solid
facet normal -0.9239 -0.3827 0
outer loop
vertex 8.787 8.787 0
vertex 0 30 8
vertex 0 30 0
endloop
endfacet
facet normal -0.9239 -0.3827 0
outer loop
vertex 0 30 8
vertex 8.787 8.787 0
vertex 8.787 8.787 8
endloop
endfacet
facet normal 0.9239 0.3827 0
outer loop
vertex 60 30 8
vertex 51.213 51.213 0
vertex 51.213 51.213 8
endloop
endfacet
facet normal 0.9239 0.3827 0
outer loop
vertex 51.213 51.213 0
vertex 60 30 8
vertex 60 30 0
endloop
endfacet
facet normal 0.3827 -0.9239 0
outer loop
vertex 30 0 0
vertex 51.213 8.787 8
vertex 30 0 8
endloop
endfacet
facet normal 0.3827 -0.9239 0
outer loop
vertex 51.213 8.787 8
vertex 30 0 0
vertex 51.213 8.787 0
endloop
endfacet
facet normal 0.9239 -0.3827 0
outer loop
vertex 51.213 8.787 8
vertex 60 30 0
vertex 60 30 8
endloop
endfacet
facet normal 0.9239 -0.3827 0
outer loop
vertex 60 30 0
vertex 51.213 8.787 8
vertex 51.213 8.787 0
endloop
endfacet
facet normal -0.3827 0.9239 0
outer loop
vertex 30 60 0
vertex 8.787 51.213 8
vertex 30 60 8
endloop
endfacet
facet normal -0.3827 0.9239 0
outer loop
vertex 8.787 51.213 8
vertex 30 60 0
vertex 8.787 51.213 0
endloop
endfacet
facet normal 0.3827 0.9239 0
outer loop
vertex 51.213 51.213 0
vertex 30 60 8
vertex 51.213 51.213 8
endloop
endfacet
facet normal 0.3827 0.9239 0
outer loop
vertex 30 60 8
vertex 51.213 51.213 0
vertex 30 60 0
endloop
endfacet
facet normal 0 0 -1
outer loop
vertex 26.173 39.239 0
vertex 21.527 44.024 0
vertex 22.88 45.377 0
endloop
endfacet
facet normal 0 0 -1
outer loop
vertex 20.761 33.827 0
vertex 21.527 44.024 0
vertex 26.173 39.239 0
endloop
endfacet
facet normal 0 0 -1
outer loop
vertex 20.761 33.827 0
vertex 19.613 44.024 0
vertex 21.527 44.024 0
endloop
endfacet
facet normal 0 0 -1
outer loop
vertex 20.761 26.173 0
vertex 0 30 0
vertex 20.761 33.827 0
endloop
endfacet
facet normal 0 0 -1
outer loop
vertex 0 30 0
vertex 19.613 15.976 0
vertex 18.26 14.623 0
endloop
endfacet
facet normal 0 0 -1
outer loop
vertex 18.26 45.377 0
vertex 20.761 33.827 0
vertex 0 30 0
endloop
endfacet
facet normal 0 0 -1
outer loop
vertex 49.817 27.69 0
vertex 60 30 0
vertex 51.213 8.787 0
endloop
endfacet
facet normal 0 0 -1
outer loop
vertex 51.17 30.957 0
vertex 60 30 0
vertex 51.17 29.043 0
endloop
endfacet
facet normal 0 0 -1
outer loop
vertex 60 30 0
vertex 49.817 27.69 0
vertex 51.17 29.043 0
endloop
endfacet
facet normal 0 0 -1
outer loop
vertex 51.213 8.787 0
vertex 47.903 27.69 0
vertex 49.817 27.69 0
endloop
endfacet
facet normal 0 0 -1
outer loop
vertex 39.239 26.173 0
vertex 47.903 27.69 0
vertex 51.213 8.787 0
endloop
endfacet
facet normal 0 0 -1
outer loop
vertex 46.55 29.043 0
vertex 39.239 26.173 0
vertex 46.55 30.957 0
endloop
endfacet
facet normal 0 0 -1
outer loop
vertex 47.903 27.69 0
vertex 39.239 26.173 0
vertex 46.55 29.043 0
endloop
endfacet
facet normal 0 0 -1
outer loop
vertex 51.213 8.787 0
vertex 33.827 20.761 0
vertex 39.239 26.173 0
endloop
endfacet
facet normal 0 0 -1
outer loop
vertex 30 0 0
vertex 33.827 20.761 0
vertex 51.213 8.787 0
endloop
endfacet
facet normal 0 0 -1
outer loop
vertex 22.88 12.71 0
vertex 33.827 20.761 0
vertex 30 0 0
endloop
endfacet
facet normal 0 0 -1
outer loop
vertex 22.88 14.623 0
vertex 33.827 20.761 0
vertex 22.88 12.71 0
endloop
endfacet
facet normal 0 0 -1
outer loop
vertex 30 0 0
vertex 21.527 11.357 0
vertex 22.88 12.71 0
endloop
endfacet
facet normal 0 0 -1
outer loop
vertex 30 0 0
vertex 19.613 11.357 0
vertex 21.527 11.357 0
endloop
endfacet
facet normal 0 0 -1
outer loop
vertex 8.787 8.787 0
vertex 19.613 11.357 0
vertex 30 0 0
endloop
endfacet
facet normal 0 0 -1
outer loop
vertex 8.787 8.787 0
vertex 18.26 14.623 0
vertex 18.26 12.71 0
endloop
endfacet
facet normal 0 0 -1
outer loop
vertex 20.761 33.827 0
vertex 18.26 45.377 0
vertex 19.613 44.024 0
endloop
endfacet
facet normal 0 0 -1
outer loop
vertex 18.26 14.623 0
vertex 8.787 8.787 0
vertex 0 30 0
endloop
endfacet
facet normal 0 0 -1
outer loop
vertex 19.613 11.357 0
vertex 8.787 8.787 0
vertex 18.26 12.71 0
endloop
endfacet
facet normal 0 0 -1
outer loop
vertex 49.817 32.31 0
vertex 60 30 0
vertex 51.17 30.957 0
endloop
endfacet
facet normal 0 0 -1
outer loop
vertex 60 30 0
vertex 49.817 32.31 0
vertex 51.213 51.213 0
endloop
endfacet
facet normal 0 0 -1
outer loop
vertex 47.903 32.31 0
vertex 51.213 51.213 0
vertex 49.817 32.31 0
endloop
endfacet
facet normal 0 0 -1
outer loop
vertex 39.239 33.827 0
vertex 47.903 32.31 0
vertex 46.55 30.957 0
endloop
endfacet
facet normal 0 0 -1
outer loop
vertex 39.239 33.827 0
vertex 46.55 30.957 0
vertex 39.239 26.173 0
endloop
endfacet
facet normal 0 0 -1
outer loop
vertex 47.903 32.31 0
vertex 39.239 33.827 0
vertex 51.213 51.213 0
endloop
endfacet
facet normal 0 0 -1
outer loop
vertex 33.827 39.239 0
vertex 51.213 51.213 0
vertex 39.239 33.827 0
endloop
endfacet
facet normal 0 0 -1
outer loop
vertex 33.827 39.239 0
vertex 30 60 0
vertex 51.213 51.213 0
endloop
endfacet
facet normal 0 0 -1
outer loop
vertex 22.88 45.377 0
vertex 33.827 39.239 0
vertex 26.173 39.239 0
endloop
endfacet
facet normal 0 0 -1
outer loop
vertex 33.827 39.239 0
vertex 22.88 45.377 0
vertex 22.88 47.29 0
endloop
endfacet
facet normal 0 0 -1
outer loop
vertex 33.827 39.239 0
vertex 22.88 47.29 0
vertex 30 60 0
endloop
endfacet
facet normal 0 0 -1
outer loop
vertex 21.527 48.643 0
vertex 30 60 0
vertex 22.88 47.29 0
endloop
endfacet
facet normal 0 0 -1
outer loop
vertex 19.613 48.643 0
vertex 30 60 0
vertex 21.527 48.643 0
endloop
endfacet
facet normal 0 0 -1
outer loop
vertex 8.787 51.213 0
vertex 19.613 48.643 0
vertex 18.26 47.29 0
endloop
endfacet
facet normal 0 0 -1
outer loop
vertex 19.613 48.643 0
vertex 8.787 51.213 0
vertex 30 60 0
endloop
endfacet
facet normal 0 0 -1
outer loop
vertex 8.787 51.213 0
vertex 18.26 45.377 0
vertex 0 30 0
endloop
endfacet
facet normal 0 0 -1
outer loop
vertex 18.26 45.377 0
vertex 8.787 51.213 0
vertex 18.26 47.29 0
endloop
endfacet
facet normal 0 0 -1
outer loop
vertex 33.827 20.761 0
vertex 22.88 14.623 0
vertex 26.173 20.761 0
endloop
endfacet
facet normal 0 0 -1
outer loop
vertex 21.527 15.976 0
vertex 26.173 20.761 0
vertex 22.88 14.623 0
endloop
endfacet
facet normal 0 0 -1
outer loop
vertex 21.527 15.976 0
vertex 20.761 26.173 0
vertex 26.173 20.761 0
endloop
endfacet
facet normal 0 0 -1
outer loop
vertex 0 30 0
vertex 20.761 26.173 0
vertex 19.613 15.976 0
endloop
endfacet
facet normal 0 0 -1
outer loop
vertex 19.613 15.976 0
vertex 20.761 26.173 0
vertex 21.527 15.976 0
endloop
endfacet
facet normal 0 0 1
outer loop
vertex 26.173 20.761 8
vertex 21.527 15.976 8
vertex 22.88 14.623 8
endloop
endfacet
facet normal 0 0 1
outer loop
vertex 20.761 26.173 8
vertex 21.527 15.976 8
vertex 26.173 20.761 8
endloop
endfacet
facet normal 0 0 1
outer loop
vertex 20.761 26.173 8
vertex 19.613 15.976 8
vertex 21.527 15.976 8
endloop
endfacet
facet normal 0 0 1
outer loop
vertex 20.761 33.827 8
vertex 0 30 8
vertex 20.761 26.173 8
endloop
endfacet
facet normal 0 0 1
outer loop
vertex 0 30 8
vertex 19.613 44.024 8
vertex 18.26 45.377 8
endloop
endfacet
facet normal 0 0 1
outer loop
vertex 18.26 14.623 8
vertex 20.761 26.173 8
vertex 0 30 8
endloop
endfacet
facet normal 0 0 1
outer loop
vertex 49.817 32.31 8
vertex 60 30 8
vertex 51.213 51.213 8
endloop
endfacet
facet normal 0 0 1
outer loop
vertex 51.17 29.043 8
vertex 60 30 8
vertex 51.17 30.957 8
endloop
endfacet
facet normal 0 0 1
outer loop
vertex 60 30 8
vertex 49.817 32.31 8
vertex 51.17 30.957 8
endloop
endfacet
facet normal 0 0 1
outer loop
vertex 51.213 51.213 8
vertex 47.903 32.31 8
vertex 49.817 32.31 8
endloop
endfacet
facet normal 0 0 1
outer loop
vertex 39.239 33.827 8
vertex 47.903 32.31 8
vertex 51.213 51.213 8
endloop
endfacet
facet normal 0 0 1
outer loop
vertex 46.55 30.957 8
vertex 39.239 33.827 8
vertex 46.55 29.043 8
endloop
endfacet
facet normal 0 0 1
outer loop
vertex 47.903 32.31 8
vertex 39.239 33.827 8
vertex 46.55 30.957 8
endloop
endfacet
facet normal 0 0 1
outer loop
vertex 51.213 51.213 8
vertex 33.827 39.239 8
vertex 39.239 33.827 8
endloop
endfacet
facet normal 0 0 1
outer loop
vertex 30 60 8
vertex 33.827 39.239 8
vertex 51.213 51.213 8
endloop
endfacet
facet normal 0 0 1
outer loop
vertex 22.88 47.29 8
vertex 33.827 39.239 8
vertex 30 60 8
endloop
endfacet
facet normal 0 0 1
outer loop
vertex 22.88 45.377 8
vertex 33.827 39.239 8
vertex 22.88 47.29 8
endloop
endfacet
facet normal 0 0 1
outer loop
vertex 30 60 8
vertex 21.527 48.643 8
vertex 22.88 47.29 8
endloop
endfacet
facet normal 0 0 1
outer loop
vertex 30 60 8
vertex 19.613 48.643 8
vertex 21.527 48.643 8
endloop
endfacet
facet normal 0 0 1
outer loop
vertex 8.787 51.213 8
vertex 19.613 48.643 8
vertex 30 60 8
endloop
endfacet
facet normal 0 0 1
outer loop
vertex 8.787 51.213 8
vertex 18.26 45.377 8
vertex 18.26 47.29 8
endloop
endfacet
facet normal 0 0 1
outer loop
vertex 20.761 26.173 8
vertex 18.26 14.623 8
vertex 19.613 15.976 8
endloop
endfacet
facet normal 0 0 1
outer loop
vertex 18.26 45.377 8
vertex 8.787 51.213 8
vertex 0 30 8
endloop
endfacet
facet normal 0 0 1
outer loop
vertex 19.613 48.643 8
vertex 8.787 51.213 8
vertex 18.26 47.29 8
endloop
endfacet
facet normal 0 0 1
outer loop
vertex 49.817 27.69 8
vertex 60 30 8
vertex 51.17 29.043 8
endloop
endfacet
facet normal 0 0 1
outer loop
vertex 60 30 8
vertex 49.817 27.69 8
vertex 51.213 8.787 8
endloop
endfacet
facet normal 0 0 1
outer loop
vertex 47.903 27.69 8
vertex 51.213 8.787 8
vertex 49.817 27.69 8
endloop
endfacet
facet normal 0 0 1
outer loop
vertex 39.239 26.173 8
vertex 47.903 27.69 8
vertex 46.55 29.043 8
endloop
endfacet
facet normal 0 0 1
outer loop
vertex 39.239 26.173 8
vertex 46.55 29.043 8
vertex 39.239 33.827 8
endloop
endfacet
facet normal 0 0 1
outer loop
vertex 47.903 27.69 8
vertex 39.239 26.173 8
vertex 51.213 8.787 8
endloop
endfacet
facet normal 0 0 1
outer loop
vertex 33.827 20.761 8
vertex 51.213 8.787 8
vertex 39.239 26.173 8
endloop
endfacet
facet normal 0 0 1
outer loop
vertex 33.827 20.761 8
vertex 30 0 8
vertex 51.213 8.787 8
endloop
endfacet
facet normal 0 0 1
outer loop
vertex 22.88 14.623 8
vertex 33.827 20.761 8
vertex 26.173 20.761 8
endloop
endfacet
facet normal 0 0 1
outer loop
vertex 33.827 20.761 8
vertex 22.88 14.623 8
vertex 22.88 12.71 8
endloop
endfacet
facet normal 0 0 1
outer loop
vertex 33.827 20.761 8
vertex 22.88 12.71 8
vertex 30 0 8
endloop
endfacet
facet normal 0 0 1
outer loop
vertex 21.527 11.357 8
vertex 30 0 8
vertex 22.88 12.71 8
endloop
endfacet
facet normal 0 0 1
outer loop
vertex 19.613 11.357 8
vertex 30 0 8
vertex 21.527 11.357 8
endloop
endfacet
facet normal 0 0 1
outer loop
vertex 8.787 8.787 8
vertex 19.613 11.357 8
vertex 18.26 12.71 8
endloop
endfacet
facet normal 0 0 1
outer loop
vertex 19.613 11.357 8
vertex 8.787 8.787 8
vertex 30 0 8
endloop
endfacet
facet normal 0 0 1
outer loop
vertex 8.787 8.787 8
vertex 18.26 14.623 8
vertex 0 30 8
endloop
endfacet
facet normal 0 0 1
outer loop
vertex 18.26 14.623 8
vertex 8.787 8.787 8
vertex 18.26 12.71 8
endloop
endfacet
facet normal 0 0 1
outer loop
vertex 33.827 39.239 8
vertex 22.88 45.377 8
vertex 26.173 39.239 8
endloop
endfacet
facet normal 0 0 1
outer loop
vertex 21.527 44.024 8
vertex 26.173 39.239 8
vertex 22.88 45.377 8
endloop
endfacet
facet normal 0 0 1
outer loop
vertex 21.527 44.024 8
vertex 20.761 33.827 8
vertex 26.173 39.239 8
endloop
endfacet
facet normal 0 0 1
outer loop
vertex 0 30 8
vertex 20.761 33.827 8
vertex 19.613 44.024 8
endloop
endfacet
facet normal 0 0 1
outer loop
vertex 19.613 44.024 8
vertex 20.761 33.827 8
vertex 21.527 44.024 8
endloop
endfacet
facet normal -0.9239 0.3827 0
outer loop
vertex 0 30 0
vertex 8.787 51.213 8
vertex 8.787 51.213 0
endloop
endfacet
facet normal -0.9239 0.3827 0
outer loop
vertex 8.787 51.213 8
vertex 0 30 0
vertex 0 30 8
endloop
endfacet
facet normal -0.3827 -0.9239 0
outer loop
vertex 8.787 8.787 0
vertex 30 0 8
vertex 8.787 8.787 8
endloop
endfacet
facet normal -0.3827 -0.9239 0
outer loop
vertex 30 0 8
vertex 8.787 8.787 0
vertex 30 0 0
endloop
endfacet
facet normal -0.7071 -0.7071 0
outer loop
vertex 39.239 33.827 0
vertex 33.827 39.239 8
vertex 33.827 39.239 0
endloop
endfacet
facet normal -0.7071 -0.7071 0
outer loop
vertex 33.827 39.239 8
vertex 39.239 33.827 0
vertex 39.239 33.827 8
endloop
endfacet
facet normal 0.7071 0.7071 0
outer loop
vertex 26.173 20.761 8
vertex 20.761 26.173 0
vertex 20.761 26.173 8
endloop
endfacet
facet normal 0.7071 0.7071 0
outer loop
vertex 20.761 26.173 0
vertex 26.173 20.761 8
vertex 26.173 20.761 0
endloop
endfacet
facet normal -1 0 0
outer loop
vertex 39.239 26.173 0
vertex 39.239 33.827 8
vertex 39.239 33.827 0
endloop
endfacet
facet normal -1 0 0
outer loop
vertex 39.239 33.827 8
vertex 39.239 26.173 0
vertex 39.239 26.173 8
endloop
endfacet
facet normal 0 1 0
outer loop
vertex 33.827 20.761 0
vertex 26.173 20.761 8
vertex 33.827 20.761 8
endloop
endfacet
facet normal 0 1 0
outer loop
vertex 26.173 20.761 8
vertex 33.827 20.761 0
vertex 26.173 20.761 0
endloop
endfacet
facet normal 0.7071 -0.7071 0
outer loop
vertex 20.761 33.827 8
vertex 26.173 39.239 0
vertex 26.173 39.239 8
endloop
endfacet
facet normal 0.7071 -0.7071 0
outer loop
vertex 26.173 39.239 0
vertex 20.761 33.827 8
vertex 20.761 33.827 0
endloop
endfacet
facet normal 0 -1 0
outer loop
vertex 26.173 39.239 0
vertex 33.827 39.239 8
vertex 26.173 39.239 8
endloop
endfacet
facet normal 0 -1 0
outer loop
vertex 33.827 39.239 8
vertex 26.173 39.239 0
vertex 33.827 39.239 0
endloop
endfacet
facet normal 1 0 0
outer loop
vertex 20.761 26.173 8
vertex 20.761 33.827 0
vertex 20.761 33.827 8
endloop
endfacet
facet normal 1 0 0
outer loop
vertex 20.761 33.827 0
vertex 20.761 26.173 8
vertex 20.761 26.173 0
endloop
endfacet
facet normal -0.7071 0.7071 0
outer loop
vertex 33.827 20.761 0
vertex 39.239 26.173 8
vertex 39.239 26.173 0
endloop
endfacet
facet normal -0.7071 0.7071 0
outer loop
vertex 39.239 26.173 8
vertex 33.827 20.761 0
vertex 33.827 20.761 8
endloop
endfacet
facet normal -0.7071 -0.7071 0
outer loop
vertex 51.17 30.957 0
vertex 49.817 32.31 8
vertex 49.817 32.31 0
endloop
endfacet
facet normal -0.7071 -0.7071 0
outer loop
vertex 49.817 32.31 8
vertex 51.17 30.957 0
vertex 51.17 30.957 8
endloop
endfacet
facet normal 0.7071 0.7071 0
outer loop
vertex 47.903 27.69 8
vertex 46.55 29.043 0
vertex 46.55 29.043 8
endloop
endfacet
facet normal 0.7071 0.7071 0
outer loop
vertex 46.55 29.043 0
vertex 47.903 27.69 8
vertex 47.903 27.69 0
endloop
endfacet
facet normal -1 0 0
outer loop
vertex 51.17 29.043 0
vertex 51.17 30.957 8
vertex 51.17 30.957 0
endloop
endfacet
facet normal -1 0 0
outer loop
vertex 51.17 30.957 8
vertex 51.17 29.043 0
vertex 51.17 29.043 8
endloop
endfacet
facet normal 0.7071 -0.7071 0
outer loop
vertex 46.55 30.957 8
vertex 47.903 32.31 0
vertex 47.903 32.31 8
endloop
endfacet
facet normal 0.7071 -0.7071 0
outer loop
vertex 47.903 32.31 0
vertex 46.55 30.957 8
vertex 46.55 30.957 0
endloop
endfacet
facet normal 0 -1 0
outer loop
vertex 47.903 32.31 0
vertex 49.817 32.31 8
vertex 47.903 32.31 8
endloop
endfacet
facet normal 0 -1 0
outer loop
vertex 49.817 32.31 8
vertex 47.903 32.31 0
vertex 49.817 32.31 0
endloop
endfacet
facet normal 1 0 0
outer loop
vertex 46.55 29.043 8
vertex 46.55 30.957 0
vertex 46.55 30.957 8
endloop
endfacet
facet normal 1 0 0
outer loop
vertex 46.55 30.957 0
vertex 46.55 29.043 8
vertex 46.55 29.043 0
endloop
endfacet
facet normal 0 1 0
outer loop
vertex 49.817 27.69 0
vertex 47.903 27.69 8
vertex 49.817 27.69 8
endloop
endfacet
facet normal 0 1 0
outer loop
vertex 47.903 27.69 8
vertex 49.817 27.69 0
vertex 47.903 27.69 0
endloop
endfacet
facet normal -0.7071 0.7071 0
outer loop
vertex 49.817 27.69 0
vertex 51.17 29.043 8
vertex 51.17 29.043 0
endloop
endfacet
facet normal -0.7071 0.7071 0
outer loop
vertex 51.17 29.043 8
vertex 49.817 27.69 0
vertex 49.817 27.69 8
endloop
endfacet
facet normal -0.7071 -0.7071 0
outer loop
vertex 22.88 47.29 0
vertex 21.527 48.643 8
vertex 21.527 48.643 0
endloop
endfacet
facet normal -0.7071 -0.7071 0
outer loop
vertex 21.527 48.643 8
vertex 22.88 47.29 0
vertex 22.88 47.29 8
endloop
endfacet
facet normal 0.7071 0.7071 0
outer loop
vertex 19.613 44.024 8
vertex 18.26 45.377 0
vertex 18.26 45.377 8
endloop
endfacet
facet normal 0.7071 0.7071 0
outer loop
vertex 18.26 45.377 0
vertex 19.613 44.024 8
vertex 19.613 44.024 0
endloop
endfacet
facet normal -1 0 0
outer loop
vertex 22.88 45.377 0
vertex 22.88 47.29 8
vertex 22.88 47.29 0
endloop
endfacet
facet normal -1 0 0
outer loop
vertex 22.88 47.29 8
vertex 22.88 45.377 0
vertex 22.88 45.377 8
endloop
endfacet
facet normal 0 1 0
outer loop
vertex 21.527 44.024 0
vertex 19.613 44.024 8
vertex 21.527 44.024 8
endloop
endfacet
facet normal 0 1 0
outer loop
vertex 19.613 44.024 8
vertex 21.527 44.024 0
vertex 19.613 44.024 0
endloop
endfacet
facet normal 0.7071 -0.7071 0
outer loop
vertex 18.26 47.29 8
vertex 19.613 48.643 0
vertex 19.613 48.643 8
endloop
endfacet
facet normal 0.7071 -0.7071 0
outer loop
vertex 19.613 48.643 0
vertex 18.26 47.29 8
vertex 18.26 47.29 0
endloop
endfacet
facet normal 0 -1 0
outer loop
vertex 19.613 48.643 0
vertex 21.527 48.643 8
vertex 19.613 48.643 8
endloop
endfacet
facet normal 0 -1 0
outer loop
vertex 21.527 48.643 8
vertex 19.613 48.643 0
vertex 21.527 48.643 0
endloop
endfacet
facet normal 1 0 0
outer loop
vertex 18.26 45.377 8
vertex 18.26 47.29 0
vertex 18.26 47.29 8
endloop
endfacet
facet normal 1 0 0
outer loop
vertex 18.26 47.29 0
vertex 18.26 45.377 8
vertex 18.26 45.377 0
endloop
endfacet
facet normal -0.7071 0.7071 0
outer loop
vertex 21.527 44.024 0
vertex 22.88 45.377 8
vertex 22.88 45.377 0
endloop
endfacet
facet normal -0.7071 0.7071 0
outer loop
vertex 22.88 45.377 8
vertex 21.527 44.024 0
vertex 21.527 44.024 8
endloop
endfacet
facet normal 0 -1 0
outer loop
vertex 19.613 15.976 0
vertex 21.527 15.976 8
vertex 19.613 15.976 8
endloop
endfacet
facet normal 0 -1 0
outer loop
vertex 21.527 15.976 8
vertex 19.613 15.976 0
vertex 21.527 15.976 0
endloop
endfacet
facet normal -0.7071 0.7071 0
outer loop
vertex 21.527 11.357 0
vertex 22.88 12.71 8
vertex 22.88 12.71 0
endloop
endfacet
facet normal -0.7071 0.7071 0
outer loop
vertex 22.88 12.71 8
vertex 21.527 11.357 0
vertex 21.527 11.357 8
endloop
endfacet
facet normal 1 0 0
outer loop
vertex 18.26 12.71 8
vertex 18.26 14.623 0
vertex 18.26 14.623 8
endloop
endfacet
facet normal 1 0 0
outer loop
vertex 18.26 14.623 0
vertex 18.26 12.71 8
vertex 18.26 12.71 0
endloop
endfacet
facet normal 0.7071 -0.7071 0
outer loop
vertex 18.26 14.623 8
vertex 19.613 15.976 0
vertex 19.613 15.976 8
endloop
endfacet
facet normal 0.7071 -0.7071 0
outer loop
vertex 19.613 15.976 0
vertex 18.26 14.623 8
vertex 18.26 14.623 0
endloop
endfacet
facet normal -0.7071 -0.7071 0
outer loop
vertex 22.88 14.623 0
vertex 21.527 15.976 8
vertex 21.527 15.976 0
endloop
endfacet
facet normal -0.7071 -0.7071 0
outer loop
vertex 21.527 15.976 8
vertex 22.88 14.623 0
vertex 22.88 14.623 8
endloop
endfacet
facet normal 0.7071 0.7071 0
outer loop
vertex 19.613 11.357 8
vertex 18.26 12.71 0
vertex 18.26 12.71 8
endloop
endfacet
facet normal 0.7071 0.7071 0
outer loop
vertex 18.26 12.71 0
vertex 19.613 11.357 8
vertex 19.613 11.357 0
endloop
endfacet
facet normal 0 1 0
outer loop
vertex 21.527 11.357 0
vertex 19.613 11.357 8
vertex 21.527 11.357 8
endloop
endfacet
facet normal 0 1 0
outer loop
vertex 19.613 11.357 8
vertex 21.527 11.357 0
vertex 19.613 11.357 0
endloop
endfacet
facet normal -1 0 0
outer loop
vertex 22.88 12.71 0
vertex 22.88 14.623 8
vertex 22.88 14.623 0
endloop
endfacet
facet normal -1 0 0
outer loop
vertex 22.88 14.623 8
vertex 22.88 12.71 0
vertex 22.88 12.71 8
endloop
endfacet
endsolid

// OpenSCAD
$fn = 32;

// ----------------------------------------------------------------------
// Polygon plate: 8-gon R30, 3 bolt windows
// ----------------------------------------------------------------------

// --- parameters (mm) ---
sides = 8;                // number of polygon sides
plate_r = 30;             // circumscribed radius of the polygon
bore_r = 10;              // centre bore radius
bolts = 3;                // number of bolt windows
ring_r = 18.86;           // bolt-circle radius
bolt_r = 2.5;             // bolt window radius
plate_t = 8;              // plate thickness, Z (extrusion height)

plate_d = 2 * plate_r;  // circumscribed diameter
bore_d = 2 * bore_r;  // centre bore diameter
bolt_d = 2 * bolt_r;  // bolt window diameter
ring_d = 2 * ring_r;  // bolt-circle diameter

profile = [[60, 30], [51.213, 51.213], [30, 60], [8.787, 51.213], [0, 30], [8.787, 8.787], [30, 0], [51.213, 8.787]];  // primary outline, 8 points, counter clockwise
void_1 = [[39.239, 33.827], [33.827, 39.239], [26.173, 39.239], [20.761, 33.827], [20.761, 26.173], [26.173, 20.761], [33.827, 20.761], [39.239, 26.173]];  // centre bore, 8 points
void_2 = [[51.17, 30.957], [49.817, 32.31], [47.903, 32.31], [46.55, 30.957], [46.55, 29.043], [47.903, 27.69], [49.817, 27.69], [51.17, 29.043]];  // bolt window 1, 8 points
void_3 = [[22.88, 47.29], [21.527, 48.643], [19.613, 48.643], [18.26, 47.29], [18.26, 45.377], [19.613, 44.024], [21.527, 44.024], [22.88, 45.377]];  // bolt window 2, 8 points
void_4 = [[22.88, 14.623], [21.527, 15.976], [19.613, 15.976], [18.26, 14.623], [18.26, 12.71], [19.613, 11.357], [21.527, 11.357], [22.88, 12.71]];  // bolt window 3, 8 points

// --- the one profile operation ---
difference() {
  linear_extrude(height = plate_t) polygon(points = profile);
  translate([0, 0, -1])
    linear_extrude(height = plate_t + 2) polygon(points = void_1);
  translate([0, 0, -1])
    linear_extrude(height = plate_t + 2) polygon(points = void_2);
  translate([0, 0, -1])
    linear_extrude(height = plate_t + 2) polygon(points = void_3);
  translate([0, 0, -1])
    linear_extrude(height = plate_t + 2) polygon(points = void_4);
}
